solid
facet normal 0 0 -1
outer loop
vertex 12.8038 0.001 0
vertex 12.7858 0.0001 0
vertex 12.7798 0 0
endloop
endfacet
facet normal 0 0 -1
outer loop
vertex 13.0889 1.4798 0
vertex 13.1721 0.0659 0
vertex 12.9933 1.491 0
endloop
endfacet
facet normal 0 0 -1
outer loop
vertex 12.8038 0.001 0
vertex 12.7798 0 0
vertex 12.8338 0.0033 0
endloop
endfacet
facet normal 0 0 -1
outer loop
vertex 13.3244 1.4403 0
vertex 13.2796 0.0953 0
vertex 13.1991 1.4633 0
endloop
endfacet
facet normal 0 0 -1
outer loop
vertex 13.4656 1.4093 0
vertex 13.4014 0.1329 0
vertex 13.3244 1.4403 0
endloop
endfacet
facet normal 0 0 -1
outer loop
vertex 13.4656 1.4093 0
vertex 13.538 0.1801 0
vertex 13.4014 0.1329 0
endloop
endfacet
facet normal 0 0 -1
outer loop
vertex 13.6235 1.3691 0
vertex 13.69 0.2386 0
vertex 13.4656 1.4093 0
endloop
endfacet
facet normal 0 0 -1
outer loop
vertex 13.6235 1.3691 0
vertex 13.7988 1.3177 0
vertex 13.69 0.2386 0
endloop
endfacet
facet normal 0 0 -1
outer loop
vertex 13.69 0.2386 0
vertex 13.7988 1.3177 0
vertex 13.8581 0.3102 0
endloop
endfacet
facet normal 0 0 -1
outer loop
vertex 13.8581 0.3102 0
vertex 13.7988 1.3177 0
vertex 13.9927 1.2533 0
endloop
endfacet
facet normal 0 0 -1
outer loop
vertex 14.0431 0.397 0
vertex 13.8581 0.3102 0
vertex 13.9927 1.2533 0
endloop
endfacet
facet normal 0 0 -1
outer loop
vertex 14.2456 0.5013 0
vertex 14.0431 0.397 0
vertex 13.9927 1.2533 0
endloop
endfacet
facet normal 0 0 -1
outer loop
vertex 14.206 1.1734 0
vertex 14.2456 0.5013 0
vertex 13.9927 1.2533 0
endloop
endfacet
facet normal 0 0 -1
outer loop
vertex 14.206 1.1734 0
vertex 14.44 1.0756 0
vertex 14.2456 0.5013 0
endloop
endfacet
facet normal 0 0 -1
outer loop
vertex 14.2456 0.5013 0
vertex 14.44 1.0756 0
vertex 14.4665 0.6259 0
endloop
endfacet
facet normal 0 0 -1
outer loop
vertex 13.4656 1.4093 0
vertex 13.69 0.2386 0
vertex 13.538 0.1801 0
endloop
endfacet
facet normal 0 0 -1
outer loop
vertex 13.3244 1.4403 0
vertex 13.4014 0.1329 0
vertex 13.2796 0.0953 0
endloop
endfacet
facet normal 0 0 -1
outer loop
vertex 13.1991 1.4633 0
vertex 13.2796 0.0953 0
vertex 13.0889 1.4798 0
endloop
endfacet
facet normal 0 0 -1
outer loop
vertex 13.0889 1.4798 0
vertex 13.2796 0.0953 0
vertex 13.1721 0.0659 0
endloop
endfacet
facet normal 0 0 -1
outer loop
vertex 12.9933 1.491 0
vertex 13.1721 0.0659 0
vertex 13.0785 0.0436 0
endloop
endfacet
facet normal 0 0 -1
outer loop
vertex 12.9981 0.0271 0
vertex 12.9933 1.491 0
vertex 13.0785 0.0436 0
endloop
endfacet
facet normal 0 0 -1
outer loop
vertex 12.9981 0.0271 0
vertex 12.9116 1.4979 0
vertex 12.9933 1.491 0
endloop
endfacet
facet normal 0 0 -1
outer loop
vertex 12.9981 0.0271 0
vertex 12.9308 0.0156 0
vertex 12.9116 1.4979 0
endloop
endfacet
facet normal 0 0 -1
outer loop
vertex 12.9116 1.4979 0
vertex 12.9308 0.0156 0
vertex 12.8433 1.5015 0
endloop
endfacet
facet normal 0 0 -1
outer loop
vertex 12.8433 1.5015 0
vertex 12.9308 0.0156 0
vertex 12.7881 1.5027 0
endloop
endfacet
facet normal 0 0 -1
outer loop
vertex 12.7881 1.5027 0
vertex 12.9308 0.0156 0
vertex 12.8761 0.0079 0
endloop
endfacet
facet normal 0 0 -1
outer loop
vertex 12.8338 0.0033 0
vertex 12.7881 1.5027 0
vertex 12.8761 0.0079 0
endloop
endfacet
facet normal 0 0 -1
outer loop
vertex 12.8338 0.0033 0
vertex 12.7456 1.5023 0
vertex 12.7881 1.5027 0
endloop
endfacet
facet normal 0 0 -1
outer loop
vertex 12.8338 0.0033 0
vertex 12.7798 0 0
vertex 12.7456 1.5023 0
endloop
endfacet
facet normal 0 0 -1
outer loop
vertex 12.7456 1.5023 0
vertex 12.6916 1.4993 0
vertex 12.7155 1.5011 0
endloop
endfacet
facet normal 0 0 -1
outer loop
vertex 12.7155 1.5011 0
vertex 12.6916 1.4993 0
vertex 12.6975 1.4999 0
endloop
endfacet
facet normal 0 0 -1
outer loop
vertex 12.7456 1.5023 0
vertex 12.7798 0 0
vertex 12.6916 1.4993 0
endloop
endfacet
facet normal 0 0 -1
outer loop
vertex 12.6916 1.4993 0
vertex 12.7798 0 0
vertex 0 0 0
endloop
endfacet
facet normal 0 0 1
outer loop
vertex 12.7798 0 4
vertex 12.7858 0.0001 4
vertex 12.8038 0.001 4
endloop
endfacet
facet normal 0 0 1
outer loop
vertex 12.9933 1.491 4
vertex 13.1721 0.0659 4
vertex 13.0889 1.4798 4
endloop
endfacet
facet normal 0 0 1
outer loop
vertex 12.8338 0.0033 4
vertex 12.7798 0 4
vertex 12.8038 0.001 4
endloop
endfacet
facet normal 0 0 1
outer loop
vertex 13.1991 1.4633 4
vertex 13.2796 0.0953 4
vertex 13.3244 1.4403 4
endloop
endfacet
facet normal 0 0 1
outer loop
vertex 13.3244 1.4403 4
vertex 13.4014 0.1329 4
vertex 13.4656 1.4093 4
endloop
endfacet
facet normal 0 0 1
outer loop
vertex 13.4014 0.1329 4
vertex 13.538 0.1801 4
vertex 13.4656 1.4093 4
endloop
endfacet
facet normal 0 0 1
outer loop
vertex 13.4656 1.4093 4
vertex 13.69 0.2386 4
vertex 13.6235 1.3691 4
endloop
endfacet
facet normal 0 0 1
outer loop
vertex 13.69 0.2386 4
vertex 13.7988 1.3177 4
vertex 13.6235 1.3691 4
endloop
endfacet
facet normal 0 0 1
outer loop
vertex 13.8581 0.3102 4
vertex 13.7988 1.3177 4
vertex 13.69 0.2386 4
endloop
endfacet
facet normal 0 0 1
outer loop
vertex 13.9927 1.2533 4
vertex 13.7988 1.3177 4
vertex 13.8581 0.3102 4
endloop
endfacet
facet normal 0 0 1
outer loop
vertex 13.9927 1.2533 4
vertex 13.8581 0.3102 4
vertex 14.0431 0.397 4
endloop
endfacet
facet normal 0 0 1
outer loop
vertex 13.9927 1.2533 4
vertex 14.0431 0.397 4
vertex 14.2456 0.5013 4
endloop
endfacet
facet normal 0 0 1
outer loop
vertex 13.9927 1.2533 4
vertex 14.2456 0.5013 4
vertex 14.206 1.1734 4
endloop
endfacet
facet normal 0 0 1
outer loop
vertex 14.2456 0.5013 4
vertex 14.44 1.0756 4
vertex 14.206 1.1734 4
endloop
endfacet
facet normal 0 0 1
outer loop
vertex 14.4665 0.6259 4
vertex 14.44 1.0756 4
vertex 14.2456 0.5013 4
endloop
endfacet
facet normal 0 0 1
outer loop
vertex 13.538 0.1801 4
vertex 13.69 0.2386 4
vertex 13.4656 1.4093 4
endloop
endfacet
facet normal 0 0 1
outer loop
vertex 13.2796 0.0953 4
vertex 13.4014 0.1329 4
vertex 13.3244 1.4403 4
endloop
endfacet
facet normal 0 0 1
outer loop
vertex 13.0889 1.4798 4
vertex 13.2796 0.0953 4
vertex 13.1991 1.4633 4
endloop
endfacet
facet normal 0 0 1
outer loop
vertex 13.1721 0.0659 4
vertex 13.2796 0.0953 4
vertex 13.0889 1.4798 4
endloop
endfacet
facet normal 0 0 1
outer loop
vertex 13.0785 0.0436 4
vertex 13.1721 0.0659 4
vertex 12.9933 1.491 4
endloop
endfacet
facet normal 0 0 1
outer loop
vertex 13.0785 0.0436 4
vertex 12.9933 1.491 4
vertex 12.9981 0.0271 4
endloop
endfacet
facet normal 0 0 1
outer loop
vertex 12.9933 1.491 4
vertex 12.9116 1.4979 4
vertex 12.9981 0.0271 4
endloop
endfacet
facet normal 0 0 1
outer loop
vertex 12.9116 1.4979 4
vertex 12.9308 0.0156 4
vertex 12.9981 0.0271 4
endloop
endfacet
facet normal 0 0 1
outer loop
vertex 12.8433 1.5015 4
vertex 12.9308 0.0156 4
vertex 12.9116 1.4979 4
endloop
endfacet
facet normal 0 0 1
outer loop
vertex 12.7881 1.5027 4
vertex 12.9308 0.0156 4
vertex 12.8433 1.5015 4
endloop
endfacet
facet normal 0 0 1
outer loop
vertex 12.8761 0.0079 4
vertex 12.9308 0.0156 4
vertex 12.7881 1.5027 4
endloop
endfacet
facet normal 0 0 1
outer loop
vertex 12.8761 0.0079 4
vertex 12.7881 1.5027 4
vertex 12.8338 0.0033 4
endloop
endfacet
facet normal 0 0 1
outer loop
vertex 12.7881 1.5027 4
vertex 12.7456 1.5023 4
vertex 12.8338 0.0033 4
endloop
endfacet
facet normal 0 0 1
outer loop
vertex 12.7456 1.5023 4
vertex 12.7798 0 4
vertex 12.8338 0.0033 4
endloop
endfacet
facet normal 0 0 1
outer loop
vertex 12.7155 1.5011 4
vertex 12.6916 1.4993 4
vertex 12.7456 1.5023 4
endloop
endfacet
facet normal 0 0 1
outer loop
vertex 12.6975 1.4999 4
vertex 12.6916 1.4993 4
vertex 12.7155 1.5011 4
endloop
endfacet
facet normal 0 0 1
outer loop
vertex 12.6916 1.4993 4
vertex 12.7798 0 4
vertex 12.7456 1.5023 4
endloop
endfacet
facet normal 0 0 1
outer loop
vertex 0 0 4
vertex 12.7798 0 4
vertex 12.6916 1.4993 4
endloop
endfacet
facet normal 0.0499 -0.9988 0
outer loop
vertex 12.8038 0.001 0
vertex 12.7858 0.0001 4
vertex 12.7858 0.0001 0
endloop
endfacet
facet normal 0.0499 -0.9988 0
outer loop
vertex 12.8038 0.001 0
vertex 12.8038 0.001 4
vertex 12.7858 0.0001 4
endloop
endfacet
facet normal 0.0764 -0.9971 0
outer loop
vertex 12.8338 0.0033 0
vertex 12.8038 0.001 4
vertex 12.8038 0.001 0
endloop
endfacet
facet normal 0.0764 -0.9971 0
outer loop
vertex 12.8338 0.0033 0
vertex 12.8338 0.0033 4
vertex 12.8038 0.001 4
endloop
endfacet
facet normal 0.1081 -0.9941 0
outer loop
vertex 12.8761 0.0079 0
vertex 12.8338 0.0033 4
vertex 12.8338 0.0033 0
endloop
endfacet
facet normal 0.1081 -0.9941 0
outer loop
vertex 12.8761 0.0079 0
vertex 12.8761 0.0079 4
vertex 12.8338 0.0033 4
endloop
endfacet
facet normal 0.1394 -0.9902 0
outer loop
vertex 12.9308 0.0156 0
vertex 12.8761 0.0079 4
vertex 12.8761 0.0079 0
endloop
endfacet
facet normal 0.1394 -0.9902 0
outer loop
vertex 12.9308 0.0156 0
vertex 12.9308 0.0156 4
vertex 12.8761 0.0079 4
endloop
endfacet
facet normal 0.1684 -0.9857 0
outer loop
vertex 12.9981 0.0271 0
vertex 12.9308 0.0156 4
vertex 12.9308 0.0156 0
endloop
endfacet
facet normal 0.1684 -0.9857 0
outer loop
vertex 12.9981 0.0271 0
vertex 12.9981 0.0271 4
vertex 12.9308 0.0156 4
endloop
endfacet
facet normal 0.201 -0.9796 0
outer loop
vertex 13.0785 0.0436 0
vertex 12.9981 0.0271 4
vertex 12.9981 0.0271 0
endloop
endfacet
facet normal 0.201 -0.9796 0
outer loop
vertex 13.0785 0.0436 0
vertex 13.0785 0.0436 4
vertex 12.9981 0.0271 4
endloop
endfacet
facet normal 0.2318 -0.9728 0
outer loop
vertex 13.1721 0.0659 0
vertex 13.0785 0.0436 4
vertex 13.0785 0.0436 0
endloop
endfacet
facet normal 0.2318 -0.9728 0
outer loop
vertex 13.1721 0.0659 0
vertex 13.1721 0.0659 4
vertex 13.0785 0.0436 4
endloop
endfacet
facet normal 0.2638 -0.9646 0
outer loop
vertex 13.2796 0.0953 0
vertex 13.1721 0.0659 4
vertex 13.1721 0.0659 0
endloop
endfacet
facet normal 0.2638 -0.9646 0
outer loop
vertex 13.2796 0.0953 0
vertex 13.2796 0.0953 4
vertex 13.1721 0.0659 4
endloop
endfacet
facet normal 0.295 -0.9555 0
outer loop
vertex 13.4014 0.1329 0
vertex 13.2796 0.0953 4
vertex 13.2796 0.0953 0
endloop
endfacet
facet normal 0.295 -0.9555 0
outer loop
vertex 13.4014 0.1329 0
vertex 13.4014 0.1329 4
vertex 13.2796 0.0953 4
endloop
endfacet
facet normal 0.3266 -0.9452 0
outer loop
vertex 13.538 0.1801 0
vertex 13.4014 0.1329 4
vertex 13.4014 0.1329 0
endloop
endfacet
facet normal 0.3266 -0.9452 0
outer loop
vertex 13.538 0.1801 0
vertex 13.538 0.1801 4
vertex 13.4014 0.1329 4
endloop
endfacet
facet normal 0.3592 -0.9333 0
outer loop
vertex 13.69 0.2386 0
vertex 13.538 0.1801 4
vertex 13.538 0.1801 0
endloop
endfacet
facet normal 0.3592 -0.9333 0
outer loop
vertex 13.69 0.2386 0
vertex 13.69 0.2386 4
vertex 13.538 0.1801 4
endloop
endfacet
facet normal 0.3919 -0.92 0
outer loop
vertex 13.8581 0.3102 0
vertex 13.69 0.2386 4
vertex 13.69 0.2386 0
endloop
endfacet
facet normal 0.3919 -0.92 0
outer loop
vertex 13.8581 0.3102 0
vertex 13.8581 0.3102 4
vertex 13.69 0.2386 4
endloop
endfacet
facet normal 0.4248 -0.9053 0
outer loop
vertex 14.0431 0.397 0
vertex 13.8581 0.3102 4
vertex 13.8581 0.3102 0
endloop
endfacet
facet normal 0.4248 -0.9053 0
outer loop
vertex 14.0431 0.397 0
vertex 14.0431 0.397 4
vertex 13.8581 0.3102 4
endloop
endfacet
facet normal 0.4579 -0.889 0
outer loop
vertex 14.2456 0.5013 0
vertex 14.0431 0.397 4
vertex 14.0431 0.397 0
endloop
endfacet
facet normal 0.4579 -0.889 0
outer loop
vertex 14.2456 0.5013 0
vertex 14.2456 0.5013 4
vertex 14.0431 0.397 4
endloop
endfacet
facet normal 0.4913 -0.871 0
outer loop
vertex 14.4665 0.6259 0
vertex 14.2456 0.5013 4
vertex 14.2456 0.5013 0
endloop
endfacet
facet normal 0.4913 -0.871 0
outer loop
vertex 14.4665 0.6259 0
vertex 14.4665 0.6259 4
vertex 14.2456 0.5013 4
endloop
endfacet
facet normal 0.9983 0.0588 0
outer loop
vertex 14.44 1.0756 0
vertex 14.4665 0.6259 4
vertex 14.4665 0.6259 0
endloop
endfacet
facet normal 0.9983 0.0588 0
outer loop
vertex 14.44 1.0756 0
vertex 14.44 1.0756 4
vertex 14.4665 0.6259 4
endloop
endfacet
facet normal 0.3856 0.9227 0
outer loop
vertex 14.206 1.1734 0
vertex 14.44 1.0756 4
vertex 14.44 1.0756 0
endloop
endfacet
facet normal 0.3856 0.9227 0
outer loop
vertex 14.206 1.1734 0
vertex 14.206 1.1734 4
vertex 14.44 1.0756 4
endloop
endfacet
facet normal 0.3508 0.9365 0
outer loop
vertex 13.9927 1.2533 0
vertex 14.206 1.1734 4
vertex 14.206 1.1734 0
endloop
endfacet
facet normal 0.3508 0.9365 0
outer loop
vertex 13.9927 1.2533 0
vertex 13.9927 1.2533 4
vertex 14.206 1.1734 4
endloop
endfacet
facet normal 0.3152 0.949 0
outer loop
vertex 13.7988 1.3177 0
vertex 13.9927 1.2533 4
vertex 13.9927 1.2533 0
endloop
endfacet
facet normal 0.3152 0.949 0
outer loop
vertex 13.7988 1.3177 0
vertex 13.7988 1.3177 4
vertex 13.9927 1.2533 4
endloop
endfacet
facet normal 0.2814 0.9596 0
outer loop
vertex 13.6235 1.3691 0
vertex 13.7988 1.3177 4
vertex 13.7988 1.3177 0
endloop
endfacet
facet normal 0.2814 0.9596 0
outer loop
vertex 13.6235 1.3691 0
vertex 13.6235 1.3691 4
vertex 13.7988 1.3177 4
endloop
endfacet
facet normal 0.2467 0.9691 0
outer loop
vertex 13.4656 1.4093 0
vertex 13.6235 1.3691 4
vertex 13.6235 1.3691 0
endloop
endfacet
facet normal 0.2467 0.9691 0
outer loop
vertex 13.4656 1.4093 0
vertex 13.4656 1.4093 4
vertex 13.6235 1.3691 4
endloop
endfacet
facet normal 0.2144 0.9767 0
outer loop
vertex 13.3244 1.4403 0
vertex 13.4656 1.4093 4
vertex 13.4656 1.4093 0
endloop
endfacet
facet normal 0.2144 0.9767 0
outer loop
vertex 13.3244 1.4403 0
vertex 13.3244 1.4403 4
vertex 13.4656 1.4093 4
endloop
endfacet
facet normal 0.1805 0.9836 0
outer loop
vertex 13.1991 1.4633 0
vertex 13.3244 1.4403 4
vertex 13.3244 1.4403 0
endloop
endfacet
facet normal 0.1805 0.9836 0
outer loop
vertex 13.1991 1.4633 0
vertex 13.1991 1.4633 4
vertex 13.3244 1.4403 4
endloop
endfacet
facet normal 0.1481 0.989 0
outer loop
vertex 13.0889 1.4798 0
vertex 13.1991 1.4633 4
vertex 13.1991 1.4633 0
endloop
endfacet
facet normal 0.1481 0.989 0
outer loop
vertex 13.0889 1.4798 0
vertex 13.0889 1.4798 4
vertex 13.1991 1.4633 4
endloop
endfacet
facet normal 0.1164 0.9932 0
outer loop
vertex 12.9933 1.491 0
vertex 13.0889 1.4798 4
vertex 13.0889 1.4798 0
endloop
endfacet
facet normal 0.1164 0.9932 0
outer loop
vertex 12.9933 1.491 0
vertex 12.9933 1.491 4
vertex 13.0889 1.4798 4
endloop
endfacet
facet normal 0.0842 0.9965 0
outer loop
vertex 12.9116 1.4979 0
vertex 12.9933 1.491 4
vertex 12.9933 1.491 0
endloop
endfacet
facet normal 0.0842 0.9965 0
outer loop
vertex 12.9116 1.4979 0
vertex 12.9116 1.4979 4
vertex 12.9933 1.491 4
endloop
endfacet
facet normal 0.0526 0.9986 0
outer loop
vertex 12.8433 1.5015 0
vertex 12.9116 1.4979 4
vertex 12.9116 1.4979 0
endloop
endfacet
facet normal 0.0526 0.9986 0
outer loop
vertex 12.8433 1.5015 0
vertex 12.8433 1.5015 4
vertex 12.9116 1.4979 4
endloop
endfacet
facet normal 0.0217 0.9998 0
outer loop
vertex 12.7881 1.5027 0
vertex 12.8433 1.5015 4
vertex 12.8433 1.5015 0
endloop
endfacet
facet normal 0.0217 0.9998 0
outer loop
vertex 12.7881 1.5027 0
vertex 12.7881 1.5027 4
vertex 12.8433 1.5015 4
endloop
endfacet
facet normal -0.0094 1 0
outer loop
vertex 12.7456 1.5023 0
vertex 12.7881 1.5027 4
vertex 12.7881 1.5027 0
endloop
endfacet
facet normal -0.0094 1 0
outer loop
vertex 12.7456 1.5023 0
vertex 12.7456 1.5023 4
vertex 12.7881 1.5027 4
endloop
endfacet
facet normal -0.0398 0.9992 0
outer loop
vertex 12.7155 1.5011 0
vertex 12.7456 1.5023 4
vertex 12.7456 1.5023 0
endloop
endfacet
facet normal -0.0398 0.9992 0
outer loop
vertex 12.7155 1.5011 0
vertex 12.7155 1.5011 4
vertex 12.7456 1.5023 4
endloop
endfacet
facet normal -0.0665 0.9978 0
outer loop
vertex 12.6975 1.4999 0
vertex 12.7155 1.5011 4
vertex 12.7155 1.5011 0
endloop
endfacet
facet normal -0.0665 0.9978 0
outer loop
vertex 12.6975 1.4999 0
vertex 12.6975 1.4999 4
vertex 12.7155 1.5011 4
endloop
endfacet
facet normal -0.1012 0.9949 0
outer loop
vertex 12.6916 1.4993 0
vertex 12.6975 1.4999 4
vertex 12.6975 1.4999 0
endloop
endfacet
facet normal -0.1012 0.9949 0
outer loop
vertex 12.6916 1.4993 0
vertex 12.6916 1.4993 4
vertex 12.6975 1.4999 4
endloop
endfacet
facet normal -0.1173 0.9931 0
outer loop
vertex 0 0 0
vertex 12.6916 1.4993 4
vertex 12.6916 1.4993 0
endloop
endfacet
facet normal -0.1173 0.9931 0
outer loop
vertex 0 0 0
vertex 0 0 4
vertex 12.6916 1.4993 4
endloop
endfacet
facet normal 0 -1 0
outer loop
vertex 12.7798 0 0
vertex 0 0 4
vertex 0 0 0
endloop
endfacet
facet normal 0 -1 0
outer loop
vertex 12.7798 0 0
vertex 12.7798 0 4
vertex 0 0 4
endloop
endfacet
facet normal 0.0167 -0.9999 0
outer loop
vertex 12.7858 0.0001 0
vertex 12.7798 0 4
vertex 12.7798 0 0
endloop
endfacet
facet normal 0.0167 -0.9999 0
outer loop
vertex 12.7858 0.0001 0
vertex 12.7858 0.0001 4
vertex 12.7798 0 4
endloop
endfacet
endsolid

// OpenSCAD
/***
 * @function tooth_generation_reference_pipeline
 * @brief Render the compact mathematical reference tooth for STL comparison.
 * Source: [`tooth/generation/reference_pipeline.scad`](tooth/generation/reference_pipeline.scad)
 */
include <../../../src/common/curve_gears_math.scad>
include <reference.scad>

$fn=96;
reference_oracle_tooth(.8,34,4,20);
